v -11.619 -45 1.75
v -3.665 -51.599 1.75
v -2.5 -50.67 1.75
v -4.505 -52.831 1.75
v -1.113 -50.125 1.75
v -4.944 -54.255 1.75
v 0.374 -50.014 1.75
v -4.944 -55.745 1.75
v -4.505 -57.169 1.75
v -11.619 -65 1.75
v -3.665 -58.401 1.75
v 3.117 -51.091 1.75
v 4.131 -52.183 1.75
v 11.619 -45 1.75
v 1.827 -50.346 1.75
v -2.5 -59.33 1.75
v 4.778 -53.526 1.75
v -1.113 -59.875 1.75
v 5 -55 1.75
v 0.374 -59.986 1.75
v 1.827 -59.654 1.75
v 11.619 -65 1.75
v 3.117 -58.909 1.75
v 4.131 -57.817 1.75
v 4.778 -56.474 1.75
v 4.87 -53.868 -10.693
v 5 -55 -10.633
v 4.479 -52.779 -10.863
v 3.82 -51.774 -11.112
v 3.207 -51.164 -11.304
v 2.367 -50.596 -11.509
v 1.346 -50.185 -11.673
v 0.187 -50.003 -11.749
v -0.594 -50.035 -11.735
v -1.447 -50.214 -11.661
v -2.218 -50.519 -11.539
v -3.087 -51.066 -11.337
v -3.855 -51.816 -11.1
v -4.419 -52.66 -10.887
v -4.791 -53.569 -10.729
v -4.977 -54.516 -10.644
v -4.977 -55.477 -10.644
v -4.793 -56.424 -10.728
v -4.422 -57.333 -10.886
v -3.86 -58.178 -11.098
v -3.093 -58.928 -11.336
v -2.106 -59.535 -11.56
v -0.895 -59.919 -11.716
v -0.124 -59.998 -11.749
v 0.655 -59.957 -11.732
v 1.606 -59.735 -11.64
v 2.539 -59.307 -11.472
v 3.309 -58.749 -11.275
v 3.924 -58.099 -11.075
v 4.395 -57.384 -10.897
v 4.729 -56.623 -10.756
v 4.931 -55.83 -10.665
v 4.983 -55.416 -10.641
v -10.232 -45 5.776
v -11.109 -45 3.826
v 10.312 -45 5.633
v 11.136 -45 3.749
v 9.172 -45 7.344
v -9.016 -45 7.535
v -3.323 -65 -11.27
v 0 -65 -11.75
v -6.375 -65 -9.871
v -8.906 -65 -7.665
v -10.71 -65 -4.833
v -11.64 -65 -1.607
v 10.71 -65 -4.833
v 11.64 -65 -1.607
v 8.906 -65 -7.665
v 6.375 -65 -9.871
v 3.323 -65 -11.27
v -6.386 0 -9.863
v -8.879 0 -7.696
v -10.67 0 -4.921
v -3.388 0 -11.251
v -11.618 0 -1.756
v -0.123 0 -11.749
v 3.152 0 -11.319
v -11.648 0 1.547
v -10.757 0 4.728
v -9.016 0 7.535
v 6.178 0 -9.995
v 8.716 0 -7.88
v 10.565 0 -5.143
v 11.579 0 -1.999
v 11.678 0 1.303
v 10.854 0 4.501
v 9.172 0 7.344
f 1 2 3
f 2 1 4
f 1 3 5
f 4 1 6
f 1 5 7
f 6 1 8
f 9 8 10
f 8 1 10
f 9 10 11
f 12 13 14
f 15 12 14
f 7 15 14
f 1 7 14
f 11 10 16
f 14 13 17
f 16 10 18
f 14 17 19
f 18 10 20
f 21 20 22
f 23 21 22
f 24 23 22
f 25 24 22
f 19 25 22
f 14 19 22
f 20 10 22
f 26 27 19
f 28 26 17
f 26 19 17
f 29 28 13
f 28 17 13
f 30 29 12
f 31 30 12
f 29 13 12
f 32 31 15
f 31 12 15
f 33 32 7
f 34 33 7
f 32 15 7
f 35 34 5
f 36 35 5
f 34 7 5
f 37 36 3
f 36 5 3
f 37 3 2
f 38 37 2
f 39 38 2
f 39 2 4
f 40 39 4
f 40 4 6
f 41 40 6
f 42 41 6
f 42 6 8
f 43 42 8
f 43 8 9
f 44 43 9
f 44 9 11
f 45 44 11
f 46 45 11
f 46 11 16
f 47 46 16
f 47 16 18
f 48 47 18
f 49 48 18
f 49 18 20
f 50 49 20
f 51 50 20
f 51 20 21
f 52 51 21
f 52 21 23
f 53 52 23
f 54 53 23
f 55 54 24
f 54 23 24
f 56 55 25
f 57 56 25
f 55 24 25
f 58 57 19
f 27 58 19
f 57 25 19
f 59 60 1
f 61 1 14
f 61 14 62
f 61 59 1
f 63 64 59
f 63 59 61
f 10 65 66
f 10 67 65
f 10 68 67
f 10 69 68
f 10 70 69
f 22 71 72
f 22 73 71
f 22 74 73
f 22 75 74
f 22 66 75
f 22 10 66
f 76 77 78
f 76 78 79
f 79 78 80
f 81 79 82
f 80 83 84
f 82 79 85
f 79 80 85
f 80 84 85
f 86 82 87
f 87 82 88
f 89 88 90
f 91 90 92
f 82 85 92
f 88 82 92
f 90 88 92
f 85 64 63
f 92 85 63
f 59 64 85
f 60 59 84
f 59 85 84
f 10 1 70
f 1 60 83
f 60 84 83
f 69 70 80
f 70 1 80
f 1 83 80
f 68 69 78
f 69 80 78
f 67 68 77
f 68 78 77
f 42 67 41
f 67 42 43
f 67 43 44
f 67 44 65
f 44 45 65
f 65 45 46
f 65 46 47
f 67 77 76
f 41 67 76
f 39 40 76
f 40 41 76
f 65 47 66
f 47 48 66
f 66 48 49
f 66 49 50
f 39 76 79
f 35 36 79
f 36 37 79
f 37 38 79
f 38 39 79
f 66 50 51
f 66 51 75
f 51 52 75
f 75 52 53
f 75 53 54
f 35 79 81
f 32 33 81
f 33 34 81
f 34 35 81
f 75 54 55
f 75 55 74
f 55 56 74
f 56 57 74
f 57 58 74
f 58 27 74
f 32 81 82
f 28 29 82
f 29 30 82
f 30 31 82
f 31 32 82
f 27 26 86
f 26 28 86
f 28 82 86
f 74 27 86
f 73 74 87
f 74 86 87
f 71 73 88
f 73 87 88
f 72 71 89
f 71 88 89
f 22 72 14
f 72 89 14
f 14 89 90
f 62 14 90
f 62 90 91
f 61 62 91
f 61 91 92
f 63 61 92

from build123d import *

# Parameters (mm, degrees)
F0_R     = 11.75
F1_DEPTH = 65
F3_DEPTH = 20
F4_R     = 5
F5_DEPTH = 13.501
F7_DEPTH = 45.001


with BuildPart() as f1:
    # F0 (on Front) → F1 (new body)
    with BuildSketch(Plane.XZ):
        Circle(F0_R)
    extrude(amount=F1_DEPTH)

    # F2 (on face) → F3 (cut)
    with BuildSketch(Plane.XZ.offset(65)):
        with BuildLine():
            ThreePointArc((11.61895, 1.75), (0, 11.75), (-11.61895, 1.75))
            Line((-11.61895, 1.75), (11.61895, 1.75))
        make_face()
    extrude(amount=-F3_DEPTH, mode=Mode.SUBTRACT)

    # F4 (on face) → F5 (cut, through all)
    with BuildSketch(Plane.XY.offset(1.75)):
        with Locations((0, -55)):
            Circle(F4_R)
    extrude(amount=-F5_DEPTH, mode=Mode.SUBTRACT)

    # F6 (on face) → F7 (cut, through all)
    with BuildSketch(Plane.XZ.offset(45)):
        with BuildLine():
            Line((-9.016035, 7.534827), (9.171855, 7.344357))
            ThreePointArc((9.171855, 7.344357), (0.123043, 11.749356), (-9.016035, 7.534827))
        make_face()
    extrude(amount=-F7_DEPTH, mode=Mode.SUBTRACT)


solid = f1.part
